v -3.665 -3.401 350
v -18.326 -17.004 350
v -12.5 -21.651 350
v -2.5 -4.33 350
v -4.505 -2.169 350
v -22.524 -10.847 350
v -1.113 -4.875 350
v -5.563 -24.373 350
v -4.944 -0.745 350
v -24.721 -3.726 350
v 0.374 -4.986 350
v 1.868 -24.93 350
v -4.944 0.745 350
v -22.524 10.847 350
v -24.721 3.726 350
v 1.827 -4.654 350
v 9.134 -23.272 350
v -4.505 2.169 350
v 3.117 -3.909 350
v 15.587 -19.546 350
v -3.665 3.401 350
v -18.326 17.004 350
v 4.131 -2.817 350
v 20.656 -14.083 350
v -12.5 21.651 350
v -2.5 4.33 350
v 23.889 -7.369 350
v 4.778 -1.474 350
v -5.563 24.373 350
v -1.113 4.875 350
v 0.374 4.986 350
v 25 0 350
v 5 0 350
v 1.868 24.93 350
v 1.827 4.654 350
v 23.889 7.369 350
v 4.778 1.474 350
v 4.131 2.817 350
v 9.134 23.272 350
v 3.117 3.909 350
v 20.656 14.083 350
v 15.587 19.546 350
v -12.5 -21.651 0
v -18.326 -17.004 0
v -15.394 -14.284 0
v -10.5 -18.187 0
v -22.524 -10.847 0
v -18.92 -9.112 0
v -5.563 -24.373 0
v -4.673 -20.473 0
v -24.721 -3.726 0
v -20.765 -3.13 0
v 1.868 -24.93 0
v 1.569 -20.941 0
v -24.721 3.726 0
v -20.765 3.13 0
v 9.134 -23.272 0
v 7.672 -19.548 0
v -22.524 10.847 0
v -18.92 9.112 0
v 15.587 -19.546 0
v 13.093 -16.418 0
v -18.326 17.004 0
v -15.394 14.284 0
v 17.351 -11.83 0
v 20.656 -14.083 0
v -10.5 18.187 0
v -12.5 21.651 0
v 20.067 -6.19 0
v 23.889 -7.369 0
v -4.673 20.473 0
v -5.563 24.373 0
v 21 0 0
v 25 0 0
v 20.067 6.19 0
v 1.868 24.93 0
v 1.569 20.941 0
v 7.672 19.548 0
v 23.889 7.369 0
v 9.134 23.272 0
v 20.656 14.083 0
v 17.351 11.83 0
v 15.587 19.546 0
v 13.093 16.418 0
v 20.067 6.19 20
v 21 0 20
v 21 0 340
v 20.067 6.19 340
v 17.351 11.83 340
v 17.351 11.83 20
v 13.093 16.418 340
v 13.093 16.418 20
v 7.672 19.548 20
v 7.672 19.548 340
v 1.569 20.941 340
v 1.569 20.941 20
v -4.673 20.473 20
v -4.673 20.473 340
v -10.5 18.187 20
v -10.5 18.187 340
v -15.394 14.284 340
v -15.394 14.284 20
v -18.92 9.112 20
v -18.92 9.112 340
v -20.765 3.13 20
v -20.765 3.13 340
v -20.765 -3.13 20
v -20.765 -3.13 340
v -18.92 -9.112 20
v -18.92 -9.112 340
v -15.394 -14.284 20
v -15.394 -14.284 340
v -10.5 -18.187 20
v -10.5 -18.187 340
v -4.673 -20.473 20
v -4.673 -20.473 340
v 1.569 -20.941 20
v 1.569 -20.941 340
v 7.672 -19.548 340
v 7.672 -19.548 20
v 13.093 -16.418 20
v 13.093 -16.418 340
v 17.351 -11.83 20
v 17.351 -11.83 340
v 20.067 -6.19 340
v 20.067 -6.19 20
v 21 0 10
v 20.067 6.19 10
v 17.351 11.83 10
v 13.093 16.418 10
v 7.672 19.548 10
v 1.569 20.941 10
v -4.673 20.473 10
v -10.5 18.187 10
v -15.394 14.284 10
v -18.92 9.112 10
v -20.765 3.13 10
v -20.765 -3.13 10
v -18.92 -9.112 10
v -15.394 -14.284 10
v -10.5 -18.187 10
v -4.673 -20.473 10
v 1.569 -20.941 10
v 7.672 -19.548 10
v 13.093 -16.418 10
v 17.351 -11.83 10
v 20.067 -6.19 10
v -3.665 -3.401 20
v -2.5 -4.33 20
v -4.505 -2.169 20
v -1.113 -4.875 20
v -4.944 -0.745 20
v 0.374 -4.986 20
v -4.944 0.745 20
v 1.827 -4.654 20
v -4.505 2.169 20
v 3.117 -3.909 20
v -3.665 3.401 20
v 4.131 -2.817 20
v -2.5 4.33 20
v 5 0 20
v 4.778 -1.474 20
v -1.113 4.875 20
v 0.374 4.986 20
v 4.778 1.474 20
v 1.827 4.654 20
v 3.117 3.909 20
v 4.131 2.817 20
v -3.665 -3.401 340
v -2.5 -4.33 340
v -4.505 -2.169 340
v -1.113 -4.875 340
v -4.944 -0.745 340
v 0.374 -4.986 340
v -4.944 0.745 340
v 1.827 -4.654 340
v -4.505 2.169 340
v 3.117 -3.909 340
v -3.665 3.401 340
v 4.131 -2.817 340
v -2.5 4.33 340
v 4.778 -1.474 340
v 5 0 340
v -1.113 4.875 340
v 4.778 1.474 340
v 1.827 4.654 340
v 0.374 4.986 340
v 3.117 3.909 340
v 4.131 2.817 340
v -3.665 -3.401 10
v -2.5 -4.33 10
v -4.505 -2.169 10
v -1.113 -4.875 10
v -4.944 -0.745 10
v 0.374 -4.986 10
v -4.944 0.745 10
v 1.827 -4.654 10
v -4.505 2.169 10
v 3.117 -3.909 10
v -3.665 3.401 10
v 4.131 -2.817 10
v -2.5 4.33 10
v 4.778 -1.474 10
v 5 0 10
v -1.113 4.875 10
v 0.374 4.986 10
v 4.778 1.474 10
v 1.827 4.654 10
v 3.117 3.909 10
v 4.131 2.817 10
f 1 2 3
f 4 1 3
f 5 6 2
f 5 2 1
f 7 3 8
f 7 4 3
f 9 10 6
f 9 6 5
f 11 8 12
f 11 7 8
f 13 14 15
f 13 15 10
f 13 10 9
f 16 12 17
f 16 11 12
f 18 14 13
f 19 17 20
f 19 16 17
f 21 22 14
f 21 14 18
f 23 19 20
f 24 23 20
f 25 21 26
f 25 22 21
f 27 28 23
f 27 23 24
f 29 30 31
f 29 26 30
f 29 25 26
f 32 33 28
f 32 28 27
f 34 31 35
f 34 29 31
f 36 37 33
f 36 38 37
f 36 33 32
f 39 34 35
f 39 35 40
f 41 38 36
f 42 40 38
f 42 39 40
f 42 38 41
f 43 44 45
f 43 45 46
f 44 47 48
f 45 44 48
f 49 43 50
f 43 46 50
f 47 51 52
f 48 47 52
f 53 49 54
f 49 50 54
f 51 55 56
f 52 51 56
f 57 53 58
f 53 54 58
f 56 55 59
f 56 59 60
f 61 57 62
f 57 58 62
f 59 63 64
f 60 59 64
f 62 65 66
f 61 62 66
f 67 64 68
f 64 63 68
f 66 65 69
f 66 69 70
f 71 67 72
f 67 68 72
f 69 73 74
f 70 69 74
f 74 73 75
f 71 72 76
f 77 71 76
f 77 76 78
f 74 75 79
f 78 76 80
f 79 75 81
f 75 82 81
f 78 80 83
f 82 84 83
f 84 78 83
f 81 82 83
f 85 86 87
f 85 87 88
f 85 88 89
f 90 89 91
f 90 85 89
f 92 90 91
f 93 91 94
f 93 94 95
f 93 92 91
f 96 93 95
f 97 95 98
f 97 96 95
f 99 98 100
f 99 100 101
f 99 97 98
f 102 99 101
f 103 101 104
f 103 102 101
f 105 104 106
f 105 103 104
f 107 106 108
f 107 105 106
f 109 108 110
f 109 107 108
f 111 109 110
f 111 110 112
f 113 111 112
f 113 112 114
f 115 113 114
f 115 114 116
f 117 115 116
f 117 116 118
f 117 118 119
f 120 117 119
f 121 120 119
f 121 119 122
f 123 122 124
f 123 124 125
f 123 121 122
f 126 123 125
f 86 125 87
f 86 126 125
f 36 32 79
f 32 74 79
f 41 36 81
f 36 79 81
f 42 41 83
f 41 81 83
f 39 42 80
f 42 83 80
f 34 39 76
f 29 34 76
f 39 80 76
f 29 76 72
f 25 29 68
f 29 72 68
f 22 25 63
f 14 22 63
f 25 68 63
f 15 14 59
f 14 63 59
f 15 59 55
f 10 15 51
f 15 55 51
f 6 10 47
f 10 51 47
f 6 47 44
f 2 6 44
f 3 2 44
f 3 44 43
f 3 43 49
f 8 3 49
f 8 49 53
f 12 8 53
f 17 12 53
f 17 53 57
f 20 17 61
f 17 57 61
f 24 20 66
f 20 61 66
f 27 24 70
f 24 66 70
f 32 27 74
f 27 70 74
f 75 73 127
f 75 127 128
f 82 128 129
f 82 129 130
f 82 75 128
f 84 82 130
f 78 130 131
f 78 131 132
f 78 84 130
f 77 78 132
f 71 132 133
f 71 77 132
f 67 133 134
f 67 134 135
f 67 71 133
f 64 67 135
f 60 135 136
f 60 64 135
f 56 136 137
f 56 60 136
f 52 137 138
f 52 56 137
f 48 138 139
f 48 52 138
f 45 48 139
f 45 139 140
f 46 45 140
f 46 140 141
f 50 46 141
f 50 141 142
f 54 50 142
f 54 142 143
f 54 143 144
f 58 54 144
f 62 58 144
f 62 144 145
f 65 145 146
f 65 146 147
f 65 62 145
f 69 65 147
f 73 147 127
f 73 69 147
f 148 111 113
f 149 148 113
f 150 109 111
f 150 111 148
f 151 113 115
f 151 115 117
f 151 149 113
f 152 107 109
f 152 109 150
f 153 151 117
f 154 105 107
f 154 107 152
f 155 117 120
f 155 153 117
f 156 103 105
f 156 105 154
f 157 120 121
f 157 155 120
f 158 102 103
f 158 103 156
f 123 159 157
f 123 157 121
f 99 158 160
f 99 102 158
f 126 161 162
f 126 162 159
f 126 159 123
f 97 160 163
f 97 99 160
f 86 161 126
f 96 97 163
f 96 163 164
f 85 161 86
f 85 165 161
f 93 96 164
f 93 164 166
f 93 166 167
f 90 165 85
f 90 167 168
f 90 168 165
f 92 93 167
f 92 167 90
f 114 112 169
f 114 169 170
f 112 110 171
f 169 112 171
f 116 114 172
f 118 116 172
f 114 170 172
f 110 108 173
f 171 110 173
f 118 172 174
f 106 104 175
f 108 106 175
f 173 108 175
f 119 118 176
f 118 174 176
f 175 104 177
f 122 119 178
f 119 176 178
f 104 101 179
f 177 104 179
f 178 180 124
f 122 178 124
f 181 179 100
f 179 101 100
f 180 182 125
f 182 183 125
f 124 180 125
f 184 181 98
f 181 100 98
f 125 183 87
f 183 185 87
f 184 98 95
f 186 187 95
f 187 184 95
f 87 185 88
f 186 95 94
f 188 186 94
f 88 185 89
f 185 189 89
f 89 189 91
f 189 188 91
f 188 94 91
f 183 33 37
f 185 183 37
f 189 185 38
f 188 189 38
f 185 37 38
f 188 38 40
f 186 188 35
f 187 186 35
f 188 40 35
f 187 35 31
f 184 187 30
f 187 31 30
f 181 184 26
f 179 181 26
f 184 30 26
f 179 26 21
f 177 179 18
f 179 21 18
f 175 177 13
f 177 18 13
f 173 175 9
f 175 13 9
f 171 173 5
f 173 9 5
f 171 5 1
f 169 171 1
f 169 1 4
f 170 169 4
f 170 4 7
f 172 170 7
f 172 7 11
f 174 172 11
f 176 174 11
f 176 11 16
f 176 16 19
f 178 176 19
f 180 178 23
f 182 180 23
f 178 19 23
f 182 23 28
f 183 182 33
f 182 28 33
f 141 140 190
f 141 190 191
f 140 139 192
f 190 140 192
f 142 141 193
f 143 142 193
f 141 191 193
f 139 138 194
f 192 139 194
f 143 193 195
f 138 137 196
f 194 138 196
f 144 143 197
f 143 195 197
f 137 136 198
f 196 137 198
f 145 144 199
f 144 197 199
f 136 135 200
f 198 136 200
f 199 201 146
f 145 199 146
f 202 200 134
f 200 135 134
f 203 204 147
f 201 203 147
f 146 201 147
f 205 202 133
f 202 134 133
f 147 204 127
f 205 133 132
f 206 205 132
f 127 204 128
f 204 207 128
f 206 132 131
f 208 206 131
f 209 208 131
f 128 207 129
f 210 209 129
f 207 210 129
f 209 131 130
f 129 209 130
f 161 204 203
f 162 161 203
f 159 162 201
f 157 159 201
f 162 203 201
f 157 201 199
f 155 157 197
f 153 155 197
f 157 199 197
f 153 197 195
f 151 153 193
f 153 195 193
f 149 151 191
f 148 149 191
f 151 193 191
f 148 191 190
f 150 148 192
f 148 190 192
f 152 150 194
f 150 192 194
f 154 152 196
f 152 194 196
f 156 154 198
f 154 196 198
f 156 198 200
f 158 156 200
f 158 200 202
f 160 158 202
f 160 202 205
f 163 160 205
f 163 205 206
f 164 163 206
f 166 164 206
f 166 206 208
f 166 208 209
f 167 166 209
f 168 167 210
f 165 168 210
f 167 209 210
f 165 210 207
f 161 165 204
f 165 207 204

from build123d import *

# Parameters (mm, degrees)
F0_R      = 25
F0_R_2    = 21
F1_DEPTH  = 10
F2_R      = 25
F3_DEPTH  = 10
F4_R      = 25
F4_R_2    = 21
F5_DEPTH  = 320
F6_R      = 25
F7_DEPTH  = 10
F8_R      = 5
F9_DEPTH  = 10
F10_R     = 5
F11_DEPTH = 10


with BuildPart() as f1:
    # F0 (on Top) → F1 (new body)
    with BuildSketch(Plane.XY):
        Circle(F0_R)
        Circle(F0_R_2, mode=Mode.SUBTRACT)
    extrude(amount=F1_DEPTH)

    # F2 (on face) → F3 (join)
    with BuildSketch(Plane.XY.offset(10)):
        Circle(F2_R)
    extrude(amount=F3_DEPTH)

    # F4 (on face) → F5 (join)
    with BuildSketch(Plane.XY.offset(20)):
        Circle(F4_R)
        Circle(F4_R_2, mode=Mode.SUBTRACT)
    extrude(amount=F5_DEPTH)

    # F6 (on face) → F7 (join)
    with BuildSketch(Plane.XY.offset(340)):
        Circle(F6_R)
    extrude(amount=F7_DEPTH)

    # F8 (on face) → F9 (cut)
    with BuildSketch(Plane(origin=(0, 0, 10), x_dir=(1, 0, 0), z_dir=(0, 0, -1))):
        Circle(F8_R)
    extrude(amount=-F9_DEPTH, mode=Mode.SUBTRACT)

    # F10 (on face) → F11 (cut)
    with BuildSketch(Plane.XY.offset(350)):
        Circle(F10_R)
    extrude(amount=-F11_DEPTH, mode=Mode.SUBTRACT)


solid = f1.part
